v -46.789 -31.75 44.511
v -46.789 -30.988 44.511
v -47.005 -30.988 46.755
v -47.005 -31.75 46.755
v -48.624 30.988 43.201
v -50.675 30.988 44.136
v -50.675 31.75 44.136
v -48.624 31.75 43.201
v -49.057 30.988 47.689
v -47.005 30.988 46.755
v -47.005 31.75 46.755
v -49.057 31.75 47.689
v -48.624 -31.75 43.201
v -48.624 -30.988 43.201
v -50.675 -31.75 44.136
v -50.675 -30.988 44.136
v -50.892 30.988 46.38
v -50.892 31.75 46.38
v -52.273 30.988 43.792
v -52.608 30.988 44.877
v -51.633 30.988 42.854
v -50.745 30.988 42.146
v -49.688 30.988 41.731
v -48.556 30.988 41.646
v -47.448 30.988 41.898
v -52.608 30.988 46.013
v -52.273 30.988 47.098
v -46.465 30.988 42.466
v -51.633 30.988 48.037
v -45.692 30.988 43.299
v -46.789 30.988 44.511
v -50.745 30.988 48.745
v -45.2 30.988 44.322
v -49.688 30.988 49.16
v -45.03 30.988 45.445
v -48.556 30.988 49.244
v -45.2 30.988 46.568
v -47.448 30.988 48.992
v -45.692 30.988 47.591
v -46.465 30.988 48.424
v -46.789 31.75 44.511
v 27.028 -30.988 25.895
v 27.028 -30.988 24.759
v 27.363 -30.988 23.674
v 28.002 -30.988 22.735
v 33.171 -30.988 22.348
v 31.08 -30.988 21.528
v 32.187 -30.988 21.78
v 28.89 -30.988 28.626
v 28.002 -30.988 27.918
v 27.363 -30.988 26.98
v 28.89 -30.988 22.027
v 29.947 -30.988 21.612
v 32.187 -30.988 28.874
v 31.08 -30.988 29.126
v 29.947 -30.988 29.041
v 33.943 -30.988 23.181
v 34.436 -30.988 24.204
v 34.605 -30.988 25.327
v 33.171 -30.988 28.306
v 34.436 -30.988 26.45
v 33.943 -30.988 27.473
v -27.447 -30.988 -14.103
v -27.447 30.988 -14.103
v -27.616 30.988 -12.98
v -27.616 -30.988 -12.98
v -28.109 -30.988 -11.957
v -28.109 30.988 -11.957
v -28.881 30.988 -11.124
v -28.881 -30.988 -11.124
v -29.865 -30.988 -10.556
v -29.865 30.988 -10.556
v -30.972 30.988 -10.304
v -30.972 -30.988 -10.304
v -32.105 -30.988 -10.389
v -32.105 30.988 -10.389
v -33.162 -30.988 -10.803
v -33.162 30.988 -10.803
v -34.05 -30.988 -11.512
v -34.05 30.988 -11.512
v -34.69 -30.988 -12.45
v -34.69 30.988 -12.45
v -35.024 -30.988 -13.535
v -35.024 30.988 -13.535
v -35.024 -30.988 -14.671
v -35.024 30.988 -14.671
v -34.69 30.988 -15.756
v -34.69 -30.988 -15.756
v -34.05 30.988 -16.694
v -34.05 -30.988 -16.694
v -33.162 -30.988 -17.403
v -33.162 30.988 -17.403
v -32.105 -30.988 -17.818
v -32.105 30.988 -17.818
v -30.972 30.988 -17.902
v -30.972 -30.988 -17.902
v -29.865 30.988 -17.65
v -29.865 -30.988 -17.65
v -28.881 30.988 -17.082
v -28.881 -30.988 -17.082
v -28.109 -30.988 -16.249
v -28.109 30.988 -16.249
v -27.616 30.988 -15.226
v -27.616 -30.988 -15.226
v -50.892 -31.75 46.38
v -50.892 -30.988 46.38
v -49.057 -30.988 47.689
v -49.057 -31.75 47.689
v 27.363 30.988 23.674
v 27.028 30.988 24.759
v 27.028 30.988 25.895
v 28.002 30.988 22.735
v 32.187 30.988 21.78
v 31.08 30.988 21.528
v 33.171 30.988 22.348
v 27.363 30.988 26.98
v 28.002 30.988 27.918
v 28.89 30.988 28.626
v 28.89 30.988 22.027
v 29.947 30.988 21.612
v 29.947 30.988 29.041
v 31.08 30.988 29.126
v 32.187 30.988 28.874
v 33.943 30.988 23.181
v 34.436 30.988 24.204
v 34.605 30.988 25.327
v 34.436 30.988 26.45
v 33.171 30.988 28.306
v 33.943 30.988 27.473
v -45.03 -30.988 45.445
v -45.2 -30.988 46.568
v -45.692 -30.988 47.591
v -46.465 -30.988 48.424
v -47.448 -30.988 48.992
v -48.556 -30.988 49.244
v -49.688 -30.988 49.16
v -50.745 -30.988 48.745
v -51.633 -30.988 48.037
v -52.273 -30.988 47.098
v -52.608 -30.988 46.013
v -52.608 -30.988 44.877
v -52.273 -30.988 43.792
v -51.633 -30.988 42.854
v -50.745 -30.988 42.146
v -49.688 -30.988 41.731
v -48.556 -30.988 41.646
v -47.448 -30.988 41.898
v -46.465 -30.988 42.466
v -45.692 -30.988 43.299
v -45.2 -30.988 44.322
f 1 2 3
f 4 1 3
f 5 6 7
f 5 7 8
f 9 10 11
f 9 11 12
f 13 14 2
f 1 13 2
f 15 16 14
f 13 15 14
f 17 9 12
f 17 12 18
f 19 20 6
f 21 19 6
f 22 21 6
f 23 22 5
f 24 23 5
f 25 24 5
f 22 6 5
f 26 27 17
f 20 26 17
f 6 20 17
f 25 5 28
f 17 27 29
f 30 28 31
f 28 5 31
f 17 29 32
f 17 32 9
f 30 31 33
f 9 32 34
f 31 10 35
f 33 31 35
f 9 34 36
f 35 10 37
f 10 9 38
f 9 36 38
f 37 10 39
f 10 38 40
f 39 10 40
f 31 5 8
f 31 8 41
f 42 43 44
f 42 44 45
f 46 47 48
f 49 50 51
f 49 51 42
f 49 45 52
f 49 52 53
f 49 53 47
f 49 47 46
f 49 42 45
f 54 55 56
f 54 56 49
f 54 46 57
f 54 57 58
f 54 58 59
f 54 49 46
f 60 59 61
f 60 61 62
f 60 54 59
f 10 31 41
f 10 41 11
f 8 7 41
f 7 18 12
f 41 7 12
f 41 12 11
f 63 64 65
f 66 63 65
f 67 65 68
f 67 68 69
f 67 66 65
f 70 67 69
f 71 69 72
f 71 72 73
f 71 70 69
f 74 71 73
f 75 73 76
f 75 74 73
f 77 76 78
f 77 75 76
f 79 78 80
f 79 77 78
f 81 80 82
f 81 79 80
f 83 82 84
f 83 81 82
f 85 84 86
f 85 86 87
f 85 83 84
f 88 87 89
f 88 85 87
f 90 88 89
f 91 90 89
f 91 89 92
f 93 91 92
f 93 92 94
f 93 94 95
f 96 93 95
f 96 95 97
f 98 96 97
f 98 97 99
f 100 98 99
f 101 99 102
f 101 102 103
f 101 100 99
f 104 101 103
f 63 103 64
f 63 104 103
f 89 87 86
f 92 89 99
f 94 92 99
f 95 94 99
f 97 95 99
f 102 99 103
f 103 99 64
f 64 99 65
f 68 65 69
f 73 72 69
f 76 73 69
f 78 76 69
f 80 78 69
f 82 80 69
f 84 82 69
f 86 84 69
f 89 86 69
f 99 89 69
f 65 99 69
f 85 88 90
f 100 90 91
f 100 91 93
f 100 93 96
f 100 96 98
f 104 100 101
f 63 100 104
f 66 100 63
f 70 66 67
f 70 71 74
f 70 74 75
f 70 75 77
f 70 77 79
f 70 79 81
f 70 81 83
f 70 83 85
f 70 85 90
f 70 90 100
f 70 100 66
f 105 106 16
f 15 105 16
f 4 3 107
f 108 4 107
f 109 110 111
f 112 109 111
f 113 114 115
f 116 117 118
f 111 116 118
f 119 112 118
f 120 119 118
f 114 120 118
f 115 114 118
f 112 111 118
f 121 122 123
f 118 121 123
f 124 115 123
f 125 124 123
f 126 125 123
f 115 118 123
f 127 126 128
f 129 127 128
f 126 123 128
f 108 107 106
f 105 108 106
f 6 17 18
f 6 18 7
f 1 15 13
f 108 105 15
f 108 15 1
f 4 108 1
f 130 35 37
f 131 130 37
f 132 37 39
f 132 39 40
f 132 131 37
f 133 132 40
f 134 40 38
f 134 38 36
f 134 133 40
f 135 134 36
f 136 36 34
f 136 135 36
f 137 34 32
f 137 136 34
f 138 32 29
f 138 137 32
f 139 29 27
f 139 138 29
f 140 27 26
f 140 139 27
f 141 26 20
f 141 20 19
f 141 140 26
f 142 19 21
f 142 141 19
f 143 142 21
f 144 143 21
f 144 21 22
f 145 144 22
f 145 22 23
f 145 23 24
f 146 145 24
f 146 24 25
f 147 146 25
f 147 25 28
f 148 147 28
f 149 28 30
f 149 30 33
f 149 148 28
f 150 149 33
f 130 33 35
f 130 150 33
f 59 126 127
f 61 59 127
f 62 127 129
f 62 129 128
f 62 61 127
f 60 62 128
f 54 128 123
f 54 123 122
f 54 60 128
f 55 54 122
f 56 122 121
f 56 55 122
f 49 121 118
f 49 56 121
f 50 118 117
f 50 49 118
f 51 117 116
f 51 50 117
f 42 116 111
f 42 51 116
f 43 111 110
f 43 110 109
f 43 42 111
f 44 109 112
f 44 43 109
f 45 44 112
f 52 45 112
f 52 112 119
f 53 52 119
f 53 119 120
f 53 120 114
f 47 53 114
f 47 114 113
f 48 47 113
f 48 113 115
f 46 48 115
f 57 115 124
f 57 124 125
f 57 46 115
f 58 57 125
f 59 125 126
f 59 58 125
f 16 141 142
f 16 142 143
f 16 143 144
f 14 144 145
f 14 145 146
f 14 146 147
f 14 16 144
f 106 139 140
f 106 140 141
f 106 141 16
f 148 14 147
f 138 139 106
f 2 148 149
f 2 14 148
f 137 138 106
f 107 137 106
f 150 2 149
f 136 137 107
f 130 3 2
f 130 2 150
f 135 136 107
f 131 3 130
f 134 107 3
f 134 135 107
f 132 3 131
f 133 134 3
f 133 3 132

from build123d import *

# Parameters (mm, degrees)
F0_R          = 3.81
F1_DEPTH      = 30.988
F1_DEPTH_BACK = 30.988
F3_DEPTH      = 0.762
F3_DEPTH_BACK = 62.738


with BuildPart() as f1:
    # F0 (on Front) → F1 (new body, two sides)
    with BuildSketch(Plane.XZ) as f1_sk:
        with Locations((30.795215, 25.326908)):
            Circle(F0_R)
        with Locations((-48.84024, 45.445096)):
            Circle(F0_R)
        with Locations((-31.256877, -14.103032)):
            Circle(F0_R)
    extrude(amount=F1_DEPTH)
    extrude(f1_sk.sketch, amount=-F1_DEPTH_BACK)

    # F2 (on face) → F3 (join, two sides)
    with BuildSketch(Plane.XZ.offset(30.988)) as f3_sk:
        Polygon((-50.675425, 44.135599), (-48.623775, 43.20103), (-46.78859, 44.510527), (-47.005054, 46.754592), (-49.056704, 47.689161), (-50.89189, 46.379665), align=None)
    extrude(amount=F3_DEPTH)
    extrude(f3_sk.sketch, amount=-F3_DEPTH_BACK)


solid = f1.part
